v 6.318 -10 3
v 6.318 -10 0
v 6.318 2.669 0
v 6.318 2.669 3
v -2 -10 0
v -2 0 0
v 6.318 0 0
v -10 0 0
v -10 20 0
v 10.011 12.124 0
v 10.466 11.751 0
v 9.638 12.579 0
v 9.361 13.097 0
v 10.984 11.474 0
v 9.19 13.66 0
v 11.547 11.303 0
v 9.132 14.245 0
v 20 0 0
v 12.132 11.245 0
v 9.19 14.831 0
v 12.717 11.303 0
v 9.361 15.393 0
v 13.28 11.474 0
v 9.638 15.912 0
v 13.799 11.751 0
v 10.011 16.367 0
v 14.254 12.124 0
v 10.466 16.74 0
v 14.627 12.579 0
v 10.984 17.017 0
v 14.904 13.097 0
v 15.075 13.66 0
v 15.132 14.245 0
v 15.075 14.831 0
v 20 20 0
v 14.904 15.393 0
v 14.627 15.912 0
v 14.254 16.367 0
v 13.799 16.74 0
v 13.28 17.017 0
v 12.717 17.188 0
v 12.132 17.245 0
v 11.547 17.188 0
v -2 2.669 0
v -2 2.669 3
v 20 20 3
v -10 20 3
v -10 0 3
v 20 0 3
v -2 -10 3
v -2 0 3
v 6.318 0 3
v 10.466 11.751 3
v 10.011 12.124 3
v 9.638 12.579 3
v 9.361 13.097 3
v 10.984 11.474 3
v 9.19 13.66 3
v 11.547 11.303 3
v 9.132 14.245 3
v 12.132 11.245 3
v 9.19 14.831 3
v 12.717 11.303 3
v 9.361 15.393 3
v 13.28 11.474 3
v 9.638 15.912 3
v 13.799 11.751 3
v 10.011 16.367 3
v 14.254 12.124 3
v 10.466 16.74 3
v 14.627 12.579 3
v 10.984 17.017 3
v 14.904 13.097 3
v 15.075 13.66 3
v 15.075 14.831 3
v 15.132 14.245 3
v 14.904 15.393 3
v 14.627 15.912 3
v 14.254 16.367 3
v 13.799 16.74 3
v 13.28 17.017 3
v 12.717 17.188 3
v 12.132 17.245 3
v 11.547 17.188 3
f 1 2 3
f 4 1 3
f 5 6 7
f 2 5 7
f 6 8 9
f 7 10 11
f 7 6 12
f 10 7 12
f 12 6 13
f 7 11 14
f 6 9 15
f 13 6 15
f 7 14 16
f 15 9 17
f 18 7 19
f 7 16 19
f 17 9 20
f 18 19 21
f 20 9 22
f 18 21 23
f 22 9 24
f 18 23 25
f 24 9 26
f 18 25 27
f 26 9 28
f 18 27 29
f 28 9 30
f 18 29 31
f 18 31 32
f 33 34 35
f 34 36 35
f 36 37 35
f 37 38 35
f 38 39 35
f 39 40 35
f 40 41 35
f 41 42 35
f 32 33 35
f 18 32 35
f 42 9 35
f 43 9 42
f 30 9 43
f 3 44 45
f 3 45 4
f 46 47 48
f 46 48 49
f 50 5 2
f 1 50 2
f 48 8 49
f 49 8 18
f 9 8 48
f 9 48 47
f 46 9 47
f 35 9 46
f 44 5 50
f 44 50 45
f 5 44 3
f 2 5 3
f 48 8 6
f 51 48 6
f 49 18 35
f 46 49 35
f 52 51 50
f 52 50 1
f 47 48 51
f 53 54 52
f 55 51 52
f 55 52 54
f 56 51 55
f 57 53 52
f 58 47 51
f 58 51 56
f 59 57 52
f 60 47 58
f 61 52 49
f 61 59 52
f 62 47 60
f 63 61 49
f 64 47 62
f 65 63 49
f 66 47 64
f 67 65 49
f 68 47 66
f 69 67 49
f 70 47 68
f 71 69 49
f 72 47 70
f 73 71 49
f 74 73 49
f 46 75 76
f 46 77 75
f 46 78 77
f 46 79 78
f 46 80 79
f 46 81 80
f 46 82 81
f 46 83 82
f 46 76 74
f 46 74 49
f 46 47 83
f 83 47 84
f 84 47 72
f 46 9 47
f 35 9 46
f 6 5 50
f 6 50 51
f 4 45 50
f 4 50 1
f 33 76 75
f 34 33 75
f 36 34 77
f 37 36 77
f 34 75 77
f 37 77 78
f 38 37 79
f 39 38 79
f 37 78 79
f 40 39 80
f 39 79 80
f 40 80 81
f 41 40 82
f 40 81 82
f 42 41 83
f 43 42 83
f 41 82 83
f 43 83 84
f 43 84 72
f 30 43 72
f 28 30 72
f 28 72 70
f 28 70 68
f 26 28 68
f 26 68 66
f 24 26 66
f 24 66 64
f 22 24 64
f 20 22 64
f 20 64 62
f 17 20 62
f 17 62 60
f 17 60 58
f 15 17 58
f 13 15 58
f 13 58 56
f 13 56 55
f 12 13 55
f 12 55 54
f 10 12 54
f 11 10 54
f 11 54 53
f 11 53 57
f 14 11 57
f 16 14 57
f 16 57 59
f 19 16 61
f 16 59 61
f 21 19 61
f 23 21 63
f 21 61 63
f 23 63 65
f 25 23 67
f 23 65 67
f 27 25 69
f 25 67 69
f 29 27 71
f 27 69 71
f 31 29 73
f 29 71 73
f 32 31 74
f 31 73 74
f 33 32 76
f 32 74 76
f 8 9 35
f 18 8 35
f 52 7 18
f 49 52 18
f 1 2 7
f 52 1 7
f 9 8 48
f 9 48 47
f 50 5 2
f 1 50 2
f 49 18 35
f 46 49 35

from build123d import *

# Parameters (mm, degrees)
RECTANGLE_W      = 8.317706
RECTANGLE_H      = 12.669173
EXTRUDE_DEPTH    = 3
RECTANGLE001_W   = 30
RECTANGLE001_H   = 20
EXTRUDE001_DEPTH = 3
RECTANGLE002_W   = 30
RECTANGLE002_H   = 20
EXTRUDE002_DEPTH = 3
RECTANGLE003_W   = 8.317706
RECTANGLE003_H   = 12.669173
EXTRUDE003_DEPTH = 3
SKETCH_R         = 3
HOLE_DEPTH       = 25


with BuildPart() as extrude_body:
    # Rectangle → Extrude (new body)
    with BuildSketch(Plane(origin=(-2, -10, 0), x_dir=(1, 0, 0), z_dir=(0, 0, 1))):
        with Locations((4.158853, 6.334586)):
            Rectangle(RECTANGLE_W, RECTANGLE_H)
    extrude(amount=EXTRUDE_DEPTH)


with BuildPart() as extrude001:
    # Rectangle001 → Extrude001 (new body)
    with BuildSketch(Plane(origin=(-10, 0, 0), x_dir=(1, 0, 0), z_dir=(0, 0, 1))):
        with Locations((15, 10)):
            Rectangle(RECTANGLE001_W, RECTANGLE001_H)
    extrude(amount=EXTRUDE001_DEPTH)


with BuildPart() as extrude002:
    # Rectangle002 → Extrude002 (new body)
    with BuildSketch(Plane(origin=(-10, 0, 0), x_dir=(1, 0, 0), z_dir=(0, 0, 1))):
        with Locations((15, 10)):
            Rectangle(RECTANGLE002_W, RECTANGLE002_H)
    extrude(amount=EXTRUDE002_DEPTH)


with BuildPart() as body:
    # Rectangle003 → Extrude003 (new body)
    with BuildSketch(Plane(origin=(-2, -10, 0), x_dir=(1, 0, 0), z_dir=(0, 0, 1))):
        with Locations((4.158853, 6.334586)):
            Rectangle(RECTANGLE003_W, RECTANGLE003_H)
    extrude(amount=EXTRUDE003_DEPTH)

    # Fusion001: union Extrude002
    add(extrude002.part)

    # Sketch → Hole (cut)
    with BuildSketch(Plane.XY.offset(3)):
        with Locations((12.132212, 14.245337)):
            Circle(SKETCH_R)
    extrude(amount=-HOLE_DEPTH, mode=Mode.SUBTRACT)


solid = Compound([extrude_body.part, extrude001.part, body.part])
